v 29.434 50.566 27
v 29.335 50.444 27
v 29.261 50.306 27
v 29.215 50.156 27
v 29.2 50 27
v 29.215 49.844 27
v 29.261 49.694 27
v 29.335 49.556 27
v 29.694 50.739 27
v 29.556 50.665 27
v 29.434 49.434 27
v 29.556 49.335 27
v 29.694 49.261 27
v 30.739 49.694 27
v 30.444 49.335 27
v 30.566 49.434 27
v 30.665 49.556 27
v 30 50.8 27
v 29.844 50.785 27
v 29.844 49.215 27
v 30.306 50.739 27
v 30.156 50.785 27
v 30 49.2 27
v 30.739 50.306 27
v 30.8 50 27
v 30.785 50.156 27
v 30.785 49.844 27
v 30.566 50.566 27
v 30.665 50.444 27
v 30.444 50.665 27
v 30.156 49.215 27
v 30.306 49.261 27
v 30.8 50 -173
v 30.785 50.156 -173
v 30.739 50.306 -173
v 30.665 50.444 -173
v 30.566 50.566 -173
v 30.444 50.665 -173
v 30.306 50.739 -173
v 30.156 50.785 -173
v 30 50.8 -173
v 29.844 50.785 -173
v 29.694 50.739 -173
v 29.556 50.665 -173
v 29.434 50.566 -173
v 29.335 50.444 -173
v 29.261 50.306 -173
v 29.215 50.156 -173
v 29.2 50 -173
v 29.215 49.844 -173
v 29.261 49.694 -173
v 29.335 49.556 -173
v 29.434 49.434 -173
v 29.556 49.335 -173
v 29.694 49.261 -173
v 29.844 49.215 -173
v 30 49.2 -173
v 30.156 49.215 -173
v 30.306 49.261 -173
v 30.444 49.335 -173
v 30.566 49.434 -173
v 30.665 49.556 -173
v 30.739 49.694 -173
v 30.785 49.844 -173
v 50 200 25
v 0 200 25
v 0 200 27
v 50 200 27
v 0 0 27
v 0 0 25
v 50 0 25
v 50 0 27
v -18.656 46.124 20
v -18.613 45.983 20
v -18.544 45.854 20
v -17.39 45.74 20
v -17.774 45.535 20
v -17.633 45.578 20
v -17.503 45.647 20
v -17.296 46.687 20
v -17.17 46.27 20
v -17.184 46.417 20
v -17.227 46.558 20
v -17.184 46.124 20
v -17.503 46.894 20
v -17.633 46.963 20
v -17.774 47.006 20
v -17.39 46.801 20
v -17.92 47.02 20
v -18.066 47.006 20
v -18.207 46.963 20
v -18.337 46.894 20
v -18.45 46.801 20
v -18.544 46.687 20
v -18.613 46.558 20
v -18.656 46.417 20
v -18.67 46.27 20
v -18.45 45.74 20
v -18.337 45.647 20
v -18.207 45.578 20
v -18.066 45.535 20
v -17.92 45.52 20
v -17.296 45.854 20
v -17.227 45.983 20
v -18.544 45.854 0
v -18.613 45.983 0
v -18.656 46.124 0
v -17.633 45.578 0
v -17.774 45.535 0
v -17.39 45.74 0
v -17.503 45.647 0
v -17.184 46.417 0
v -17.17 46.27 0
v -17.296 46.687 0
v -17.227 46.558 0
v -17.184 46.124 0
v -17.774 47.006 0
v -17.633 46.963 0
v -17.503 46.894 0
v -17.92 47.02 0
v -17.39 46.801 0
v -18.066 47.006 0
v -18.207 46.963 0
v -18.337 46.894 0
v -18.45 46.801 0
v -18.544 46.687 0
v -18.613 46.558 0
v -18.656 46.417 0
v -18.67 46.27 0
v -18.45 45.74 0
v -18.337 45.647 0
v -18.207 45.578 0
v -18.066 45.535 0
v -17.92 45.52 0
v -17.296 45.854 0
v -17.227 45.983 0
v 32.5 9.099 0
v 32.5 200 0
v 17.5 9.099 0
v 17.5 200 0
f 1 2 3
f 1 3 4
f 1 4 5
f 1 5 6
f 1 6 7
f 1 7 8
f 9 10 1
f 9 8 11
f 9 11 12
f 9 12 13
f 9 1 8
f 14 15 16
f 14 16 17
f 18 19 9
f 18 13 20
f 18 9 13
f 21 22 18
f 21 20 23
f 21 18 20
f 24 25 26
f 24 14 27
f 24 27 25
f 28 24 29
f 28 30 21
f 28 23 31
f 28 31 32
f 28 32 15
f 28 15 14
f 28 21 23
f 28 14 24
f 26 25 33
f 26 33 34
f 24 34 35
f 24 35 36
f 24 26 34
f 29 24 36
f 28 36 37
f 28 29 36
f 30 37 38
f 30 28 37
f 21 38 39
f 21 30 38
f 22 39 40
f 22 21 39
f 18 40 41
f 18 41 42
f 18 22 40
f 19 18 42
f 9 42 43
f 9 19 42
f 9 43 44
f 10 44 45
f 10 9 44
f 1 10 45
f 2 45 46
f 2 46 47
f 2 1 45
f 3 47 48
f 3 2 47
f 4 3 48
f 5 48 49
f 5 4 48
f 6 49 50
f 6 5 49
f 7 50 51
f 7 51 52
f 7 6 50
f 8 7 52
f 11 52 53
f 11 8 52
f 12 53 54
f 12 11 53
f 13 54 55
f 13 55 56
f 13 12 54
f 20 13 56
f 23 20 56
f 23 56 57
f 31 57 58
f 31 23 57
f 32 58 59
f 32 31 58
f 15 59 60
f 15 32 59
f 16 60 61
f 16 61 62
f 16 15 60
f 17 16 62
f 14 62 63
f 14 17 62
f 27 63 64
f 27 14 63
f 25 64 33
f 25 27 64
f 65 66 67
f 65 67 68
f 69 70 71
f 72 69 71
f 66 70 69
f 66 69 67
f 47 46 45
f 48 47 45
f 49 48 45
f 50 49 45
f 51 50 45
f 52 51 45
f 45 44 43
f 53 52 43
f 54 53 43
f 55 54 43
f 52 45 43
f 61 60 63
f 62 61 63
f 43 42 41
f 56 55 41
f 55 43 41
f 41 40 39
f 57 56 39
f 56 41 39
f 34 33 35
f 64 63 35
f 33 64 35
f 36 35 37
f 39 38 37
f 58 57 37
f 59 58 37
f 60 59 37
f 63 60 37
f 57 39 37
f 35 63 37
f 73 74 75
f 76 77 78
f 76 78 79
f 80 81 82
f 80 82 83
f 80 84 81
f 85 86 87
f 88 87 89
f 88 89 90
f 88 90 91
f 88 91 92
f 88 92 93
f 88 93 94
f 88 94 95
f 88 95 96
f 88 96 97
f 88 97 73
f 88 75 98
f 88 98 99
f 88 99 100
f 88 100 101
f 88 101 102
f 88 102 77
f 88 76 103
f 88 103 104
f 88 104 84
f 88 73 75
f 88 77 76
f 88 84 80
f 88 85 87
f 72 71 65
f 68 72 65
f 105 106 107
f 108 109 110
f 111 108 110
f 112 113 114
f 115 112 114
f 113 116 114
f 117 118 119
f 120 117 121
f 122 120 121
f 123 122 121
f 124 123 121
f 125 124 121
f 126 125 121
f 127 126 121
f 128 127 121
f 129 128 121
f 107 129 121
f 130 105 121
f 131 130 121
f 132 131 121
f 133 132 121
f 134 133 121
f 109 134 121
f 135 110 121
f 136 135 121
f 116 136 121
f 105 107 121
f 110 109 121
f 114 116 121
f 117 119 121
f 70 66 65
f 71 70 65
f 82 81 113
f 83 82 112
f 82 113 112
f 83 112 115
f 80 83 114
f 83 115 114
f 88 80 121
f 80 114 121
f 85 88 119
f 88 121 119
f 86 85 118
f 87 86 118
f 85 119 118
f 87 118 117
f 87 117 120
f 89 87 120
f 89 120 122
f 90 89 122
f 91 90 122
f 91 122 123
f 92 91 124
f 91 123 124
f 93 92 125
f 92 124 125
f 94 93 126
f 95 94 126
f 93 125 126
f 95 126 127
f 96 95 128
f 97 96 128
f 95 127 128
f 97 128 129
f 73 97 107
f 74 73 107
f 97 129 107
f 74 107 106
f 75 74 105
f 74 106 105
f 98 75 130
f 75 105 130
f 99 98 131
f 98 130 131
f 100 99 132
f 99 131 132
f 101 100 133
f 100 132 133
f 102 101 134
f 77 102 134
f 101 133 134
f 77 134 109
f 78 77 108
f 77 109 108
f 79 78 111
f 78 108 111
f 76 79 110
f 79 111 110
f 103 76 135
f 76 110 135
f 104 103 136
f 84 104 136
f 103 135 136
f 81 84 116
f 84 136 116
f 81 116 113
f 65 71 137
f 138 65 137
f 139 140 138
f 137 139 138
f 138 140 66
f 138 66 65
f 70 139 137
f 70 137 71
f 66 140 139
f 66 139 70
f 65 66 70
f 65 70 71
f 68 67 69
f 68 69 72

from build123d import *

# Parameters (mm, degrees)
F0_W      = 50
F0_H      = 200
F1_DEPTH  = 25
F3_DEPTH  = 200.001
F5_DEPTH  = 50.001
F6_W      = 50
F6_H      = 200
F7_DEPTH  = 2
F8_R      = 0.8
F9_DEPTH  = 200
F10_R     = 0.75
F11_DEPTH = 20


with BuildPart() as f1:
    # F0 (on Top) → F1 (new body)
    with BuildSketch(Plane.XY):
        with Locations((25, 100)):
            Rectangle(F0_W, F0_H)
    extrude(amount=F1_DEPTH)

    # F2 (on face) → F3 (cut, through all)
    with BuildSketch(Plane.XZ):
        Polygon((17.5, 0), (0, 25), (0, 0), align=None)
        Polygon((50, 25), (32.5, 0), (50, 0), align=None)
    extrude(amount=-F3_DEPTH, mode=Mode.SUBTRACT)

    # F4 (on Right) → F5 (cut, through all)
    with BuildSketch(Plane.YZ):
        Polygon((0, 25), (0, 0), (9.0992558567, 0), align=None)
    extrude(amount=F5_DEPTH, mode=Mode.SUBTRACT)


with BuildPart() as f7:
    # F6 (on face) → F7 (new body)
    with BuildSketch(Plane.XY.offset(25)):
        with Locations((25, 100)):
            Rectangle(F6_W, F6_H)
    extrude(amount=F7_DEPTH)


with BuildPart() as f9:
    # F8 (on face) → F9 (new body)
    with BuildSketch(Plane.XY.offset(27)):
        with Locations((30, 50)):
            Circle(F8_R)
    extrude(amount=-F9_DEPTH)


with BuildPart() as f11:
    # F10 (on Top) → F11 (new body)
    with BuildSketch(Plane.XY):
        with Locations((-17.920082435, 46.270493418)):
            Circle(F10_R)
    extrude(amount=F11_DEPTH)


solid = Compound([f1.part, f7.part, f9.part, f11.part])
